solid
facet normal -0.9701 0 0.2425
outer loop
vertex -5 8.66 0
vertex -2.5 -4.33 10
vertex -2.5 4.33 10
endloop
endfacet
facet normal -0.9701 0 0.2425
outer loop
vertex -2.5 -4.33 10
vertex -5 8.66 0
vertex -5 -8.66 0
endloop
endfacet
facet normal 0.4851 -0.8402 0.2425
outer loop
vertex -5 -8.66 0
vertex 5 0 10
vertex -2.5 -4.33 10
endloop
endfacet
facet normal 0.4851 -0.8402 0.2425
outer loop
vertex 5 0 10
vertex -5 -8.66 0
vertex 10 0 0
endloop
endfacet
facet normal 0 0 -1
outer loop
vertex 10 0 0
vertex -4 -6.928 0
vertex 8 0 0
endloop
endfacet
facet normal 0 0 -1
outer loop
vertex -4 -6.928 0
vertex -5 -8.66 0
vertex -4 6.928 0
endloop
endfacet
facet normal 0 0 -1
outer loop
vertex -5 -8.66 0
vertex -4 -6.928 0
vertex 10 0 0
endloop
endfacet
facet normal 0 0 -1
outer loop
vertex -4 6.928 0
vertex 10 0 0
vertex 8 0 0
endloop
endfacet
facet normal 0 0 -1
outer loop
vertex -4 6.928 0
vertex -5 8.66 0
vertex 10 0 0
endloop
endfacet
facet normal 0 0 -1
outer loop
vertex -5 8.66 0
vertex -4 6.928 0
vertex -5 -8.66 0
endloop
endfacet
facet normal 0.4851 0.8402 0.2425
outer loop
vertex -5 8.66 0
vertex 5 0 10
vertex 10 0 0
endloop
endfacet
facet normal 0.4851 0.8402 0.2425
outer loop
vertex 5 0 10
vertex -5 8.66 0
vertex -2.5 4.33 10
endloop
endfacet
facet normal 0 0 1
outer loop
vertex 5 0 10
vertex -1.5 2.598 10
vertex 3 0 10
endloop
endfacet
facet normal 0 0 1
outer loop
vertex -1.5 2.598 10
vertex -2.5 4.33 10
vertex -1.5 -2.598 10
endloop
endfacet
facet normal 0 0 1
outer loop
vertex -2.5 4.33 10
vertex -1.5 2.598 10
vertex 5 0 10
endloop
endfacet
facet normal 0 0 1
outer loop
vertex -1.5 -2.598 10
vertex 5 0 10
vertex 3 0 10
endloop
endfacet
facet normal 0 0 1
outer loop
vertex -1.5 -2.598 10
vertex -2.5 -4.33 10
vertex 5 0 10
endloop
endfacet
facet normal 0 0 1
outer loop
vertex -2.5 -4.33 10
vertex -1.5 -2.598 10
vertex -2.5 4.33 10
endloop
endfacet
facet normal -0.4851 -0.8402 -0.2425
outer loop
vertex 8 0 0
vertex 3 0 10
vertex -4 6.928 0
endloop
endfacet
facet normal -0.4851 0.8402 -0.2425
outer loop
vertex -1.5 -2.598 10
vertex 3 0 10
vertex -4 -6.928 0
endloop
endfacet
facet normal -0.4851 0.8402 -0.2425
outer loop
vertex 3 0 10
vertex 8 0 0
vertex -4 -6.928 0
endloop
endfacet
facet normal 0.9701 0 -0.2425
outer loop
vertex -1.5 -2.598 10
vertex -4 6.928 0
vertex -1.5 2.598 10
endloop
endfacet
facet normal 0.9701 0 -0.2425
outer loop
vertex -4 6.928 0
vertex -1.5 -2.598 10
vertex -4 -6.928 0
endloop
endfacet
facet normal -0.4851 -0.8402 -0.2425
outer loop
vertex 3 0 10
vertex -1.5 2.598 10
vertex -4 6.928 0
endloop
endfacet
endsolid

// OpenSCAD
//#import("Solid_Egg_Centered.stl", center=true);

// First style
h = 4;
h1 = 10 - h;
//translate([0, 0, -h]) cylinder(h=h, r1=2, r2 = 3.7, $fn=200);
//translate([0, 0, -h - h1]) cylinder(h=h1, r1 = 5, r2 = 2, $fn=200);


difference() {
   cylinder(h=10, r1=10, r2=5, $fn=3);
   cylinder(h=10, r1=8, r2=3, $fn=3);
}

// second style
//h = 4;
//h1 = 10 - h;
h2 = 5;
//translate([0, 0, -h2]) cylinder(h=h2, r1=8, r2 = 3.7, $fn=200);
//translate([0, 0, -h - h1]) cylinder(h=h1, r1 = 5, r2 = 2, $fn=200);
